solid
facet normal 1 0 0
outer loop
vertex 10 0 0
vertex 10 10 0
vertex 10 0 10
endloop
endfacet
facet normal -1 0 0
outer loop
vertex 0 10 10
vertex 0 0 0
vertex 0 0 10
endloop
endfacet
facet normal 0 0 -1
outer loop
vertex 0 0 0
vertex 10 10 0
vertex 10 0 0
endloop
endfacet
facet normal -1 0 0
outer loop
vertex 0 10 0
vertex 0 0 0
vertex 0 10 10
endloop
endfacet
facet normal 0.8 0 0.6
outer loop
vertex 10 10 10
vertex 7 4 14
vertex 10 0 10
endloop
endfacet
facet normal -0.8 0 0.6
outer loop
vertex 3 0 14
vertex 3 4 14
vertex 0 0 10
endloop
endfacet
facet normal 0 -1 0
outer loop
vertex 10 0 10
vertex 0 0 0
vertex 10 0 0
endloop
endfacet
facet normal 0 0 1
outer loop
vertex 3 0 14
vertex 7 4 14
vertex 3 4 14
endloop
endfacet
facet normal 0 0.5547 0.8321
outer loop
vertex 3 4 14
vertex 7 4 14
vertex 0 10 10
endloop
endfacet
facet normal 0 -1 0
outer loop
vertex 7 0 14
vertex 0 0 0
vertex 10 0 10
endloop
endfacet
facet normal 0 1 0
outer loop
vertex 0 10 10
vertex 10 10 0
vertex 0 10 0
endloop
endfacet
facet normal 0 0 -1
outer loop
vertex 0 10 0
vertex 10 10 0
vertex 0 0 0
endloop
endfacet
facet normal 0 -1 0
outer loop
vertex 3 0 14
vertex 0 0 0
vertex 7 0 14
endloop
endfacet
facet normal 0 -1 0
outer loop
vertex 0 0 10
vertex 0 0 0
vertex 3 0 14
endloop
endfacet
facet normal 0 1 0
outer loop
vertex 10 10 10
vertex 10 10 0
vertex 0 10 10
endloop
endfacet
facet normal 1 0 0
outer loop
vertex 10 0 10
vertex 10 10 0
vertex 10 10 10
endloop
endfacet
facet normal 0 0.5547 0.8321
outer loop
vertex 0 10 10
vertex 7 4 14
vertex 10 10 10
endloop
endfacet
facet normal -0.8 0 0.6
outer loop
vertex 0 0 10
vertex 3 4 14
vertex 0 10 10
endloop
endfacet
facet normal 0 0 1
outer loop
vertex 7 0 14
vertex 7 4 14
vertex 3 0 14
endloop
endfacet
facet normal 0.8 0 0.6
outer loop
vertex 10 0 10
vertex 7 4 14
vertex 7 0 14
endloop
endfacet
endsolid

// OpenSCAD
hull() { cube(10); translate([3, 0, 0]) cube([4, 4, 14]); }
